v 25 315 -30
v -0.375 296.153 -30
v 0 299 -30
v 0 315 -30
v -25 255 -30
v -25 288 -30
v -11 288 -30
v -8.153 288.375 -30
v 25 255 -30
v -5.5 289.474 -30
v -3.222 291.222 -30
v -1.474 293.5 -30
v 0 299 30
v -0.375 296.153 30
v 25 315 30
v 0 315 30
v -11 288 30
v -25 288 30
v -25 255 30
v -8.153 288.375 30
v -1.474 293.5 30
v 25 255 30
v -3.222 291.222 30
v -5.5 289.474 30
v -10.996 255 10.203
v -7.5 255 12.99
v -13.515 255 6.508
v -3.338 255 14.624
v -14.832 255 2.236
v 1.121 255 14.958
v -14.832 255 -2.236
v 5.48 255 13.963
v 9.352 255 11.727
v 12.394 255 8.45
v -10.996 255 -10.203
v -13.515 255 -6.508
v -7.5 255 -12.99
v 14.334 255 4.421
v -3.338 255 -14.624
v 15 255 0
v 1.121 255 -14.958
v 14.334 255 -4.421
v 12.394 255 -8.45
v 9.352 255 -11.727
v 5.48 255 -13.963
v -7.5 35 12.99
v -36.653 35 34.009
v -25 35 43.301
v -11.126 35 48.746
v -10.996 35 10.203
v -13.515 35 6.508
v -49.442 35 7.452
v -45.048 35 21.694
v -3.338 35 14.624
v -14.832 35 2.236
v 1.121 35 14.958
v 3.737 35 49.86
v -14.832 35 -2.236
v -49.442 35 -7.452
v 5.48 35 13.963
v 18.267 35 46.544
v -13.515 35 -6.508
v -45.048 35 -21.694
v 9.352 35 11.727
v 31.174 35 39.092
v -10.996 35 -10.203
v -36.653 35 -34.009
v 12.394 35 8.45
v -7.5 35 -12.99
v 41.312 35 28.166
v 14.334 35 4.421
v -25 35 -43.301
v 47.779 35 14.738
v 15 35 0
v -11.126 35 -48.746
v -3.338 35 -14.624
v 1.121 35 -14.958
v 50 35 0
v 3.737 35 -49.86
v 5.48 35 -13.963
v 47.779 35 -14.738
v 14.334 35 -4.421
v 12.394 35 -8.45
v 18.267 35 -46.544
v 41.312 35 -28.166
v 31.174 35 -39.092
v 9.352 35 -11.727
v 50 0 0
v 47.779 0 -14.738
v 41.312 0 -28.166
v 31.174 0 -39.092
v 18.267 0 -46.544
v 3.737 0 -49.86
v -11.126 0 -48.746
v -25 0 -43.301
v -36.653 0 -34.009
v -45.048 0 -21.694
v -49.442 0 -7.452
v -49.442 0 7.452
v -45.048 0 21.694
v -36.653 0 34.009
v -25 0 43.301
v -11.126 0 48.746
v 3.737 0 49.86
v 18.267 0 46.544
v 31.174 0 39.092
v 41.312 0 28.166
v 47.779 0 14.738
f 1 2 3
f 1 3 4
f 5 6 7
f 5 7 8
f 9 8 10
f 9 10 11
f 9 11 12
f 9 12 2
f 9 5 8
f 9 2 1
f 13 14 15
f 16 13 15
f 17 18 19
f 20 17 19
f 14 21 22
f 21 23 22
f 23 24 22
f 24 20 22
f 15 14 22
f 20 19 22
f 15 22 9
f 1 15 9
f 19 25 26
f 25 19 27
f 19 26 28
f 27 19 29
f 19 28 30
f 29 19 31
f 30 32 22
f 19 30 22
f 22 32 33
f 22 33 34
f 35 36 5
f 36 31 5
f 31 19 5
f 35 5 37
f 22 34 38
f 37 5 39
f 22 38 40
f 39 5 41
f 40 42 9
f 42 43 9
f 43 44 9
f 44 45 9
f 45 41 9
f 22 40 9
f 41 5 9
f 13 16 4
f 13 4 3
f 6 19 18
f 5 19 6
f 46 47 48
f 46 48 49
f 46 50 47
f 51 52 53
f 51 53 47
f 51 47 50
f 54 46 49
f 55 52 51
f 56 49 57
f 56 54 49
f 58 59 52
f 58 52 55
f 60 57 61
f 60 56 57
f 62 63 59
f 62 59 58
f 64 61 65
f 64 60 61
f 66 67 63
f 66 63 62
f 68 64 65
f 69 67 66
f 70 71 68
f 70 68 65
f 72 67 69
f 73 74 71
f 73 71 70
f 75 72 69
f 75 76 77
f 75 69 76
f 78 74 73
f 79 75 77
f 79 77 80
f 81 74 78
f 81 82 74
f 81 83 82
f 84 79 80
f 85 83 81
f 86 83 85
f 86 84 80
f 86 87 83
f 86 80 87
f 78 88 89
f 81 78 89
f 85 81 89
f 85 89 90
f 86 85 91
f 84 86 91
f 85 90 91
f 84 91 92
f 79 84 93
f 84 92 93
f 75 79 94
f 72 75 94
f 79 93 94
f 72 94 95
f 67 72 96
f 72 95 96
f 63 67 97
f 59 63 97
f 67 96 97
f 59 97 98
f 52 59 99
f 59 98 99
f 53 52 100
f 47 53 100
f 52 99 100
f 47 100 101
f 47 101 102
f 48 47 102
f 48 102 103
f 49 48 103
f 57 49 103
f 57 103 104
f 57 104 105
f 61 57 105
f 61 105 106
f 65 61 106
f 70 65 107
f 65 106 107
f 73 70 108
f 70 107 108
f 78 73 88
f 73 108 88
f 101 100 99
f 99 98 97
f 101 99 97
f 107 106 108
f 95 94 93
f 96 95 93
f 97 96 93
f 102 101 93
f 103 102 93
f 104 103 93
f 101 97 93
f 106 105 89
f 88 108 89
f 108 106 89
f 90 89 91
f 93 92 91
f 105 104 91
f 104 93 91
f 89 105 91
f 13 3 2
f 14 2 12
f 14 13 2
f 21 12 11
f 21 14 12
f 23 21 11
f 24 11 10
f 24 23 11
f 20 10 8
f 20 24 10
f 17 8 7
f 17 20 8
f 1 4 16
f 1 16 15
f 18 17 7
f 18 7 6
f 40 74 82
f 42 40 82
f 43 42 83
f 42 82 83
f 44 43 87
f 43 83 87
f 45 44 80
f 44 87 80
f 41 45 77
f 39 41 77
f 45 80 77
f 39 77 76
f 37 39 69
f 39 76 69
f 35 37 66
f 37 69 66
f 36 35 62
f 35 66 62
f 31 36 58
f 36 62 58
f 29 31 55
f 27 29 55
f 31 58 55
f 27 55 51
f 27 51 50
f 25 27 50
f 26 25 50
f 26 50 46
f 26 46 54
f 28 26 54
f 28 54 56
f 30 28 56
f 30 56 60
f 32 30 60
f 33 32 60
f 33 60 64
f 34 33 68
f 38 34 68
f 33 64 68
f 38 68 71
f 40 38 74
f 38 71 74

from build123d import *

# Parameters (mm, degrees)
SKETCH1_R           = 50
BOSS_EXTRUDE1_DEPTH = 35
SKETCH2_R           = 15
BOSS_EXTRUDE2_DEPTH = 220
SKETCH3_W           = 50
SKETCH3_H           = 60
BOSS_EXTRUDE3_DEPTH = 60
CUT_EXTRUDE1_DEPTH  = 81


with BuildPart() as part:
    # Sketch1 → Boss-Extrude1 (new body)
    with BuildSketch(Plane(origin=(0, 0, 0), x_dir=(1, 0, 0), z_dir=(0, 1, 0))):
        Circle(SKETCH1_R)
    extrude(amount=BOSS_EXTRUDE1_DEPTH)

    # Sketch2 → Boss-Extrude2 (add)
    with BuildSketch(Plane(origin=(0, 35, 0), x_dir=(1, 0, 0), z_dir=(0, 1, 0))):
        Circle(SKETCH2_R)
    extrude(amount=BOSS_EXTRUDE2_DEPTH)

    # Sketch3 → Boss-Extrude3 (add)
    with BuildSketch(Plane(origin=(0, 255, 0), x_dir=(1, 0, 0), z_dir=(0, 1, 0))):
        Rectangle(SKETCH3_W, SKETCH3_H)
    extrude(amount=BOSS_EXTRUDE3_DEPTH)

    # Sketch4 → Cut-Extrude1 (cut, through all)
    with BuildSketch(Plane.XY.offset(30)):
        with BuildLine():
            Line((0, 315), (0, 299))
            ThreePointArc((0, 299), (-3.221825407, 291.221825407), (-11, 288))
            Line((-11, 288), (-25, 288))
            Line((-25, 288), (-25, 315))
            Line((-25, 315), (0, 315))
        make_face()
    extrude(amount=-CUT_EXTRUDE1_DEPTH, mode=Mode.SUBTRACT)


solid = part.part
